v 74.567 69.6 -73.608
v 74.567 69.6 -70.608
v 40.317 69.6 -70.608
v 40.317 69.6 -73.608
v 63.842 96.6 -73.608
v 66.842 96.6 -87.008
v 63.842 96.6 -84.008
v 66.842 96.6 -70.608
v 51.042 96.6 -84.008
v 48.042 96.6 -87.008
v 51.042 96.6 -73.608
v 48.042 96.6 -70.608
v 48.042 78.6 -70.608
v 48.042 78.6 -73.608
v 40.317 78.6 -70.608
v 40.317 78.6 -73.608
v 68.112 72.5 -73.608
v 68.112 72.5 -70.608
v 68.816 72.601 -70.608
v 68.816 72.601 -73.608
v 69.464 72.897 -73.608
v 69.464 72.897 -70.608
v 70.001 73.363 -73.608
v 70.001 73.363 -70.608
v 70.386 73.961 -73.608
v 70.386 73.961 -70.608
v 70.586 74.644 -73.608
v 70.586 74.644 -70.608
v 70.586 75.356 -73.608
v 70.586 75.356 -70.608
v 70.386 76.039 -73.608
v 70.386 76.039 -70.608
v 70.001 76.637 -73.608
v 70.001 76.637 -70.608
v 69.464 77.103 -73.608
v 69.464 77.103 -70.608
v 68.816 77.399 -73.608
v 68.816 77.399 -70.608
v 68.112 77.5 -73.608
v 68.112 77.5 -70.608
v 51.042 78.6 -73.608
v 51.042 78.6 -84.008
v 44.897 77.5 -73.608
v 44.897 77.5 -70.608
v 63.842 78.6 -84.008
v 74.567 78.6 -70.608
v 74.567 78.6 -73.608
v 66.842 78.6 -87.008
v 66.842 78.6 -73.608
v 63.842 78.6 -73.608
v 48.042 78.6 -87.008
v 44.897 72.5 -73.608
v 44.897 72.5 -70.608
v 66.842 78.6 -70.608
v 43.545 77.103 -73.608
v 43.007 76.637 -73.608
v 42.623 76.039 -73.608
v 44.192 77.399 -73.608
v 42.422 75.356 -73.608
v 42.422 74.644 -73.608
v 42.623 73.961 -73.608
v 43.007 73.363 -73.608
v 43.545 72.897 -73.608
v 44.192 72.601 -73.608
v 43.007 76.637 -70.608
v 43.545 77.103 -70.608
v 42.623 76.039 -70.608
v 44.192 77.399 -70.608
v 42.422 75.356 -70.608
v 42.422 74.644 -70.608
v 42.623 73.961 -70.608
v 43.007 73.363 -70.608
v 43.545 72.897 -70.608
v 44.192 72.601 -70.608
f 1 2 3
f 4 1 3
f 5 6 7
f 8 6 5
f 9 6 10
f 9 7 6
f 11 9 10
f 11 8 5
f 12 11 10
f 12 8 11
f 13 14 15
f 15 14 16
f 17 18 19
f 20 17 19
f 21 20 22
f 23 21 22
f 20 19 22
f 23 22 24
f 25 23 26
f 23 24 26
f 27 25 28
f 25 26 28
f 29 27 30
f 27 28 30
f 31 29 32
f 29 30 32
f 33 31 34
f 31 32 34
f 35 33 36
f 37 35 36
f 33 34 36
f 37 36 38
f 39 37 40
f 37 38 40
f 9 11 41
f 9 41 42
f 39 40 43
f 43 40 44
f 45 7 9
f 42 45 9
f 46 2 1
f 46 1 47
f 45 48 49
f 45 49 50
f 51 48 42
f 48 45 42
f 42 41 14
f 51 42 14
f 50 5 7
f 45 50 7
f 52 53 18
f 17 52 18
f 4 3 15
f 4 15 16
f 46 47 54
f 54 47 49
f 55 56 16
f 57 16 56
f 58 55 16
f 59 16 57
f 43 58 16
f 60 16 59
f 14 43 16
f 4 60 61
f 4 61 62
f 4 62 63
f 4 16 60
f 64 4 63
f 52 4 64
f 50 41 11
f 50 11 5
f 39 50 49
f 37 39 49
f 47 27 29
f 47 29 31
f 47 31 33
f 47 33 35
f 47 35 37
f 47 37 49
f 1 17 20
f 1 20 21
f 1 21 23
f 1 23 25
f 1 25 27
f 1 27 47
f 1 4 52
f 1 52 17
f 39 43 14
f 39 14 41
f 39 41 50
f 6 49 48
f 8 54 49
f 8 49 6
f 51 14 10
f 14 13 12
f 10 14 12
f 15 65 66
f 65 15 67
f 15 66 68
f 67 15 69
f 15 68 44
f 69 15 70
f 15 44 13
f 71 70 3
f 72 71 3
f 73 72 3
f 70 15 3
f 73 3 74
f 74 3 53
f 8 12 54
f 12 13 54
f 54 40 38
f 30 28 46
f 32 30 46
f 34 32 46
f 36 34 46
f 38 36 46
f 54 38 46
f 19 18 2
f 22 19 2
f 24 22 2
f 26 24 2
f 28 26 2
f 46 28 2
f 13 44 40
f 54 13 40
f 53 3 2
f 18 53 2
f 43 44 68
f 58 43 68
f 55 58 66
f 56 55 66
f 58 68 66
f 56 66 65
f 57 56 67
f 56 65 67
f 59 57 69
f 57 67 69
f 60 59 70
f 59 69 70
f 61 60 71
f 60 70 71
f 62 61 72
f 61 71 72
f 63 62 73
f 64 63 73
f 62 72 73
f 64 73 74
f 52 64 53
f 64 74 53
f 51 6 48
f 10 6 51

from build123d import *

# Parameters (mm, degrees)
BOSS_EXTRUDE1_DEPTH = 17.85
SKETCH5_R           = 1
CUT_EXTRUDE1_DEPTH  = 10
SKETCH6_W           = 34.25
SKETCH6_H           = 9
BOSS_EXTRUDE2_DEPTH = 3
SKETCH7_W           = 17.85
SKETCH7_H           = 15.1
BOSS_EXTRUDE3_DEPTH = 5.225
BOSS_EXTRUDE4_START = 23.25
SKETCH7_3_W         = 17.85
SKETCH7_3_H         = 15.1
BOSS_EXTRUDE4_DEPTH = 5.225
CUT_EXTRUDE2_REACH  = 125.33
SKETCH8_W           = 7.725
SKETCH8_H           = 18
SKETCH9_W           = 34.25
SKETCH9_H           = 3
BOSS_EXTRUDE5_DEPTH = 18
SKETCH10_W          = 12.8
SKETCH10_H          = 2.9
CUT_EXTRUDE3_DEPTH  = 14.85
CUT_EXTRUDE4_REACH  = 124.932
SKETCH11_W          = 7.725
SKETCH11_H          = 18
SKETCH12_W          = 18.8
SKETCH12_H          = 18
CUT_EXTRUDE5_DEPTH  = 4.45
SKETCH13_W          = 18.8
SKETCH13_H          = 18
BOSS_EXTRUDE6_DEPTH = 3


with BuildPart() as part:
    # Sketch4 → Boss-Extrude1 (new body)
    with BuildSketch(Plane(origin=(0, 0, -70.608208955), x_dir=(-1, 0, 0), z_dir=(0, 0, -1))):
        Polygon((-69.066917791, 81.5), (-45.816917791, 81.5), (-45.816917791, 96.6), (-40.316917791, 96.6), (-40.316917791, 78.6), (-74.566917791, 78.6), (-74.566917791, 96.6), (-69.066917791, 96.6), align=None)
    extrude(amount=BOSS_EXTRUDE1_DEPTH)

    # Sketch5 → Cut-Extrude1 (cut)
    with BuildSketch(Plane(origin=(0, 0, -88.458208955), x_dir=(-1, 0, 0), z_dir=(0, 0, -1))):
        with Locations((-43.741917791, 88)):
            Circle(SKETCH5_R)
        with Locations((-71.141917791, 88)):
            Circle(SKETCH5_R)
    extrude(amount=-CUT_EXTRUDE1_DEPTH, mode=Mode.SUBTRACT)

    # Sketch6 → Boss-Extrude2 (add)
    with BuildSketch(Plane(origin=(0, 0, -70.608208955), x_dir=(-1, 0, 0), z_dir=(0, 0, -1))):
        with Locations((-57.441917791, 74.1)):
            Rectangle(SKETCH6_W, SKETCH6_H)
        with BuildLine():
            Line((-68.111940299, 77.5), (-44.896828216, 77.5))
            ThreePointArc((-44.896828216, 77.5), (-42.396828216, 75), (-44.896828216, 72.5))
            Line((-44.896828216, 72.5), (-68.111940299, 72.5))
            ThreePointArc((-68.111940299, 72.5), (-70.611940299, 75), (-68.111940299, 77.5))
        make_face(mode=Mode.SUBTRACT)
    extrude(amount=BOSS_EXTRUDE2_DEPTH)

    # Sketch7 → Boss-Extrude3 (add)
    with BuildSketch(Plane(origin=(45.816917791, 0, 0), x_dir=(0, 0, -1), z_dir=(1, 0, 0))):
        with Locations((79.533208955, 89.05)):
            Rectangle(SKETCH7_W, SKETCH7_H)
    extrude(amount=BOSS_EXTRUDE3_DEPTH)

    # Sketch7<3> → Boss-Extrude4 (add)
    with BuildSketch(Plane(origin=(45.816917791, 0, 0), x_dir=(0, 0, -1), z_dir=(1, 0, 0)).offset(BOSS_EXTRUDE4_START)):
        with Locations((79.533208955, 89.05)):
            Rectangle(SKETCH7_3_W, SKETCH7_3_H)
    extrude(amount=-BOSS_EXTRUDE4_DEPTH)

    # Sketch8 → Cut-Extrude2 (cut, up to next)
    with BuildSketch(Plane(origin=(0, 0, -88.458208955), x_dir=(-1, 0, 0), z_dir=(0, 0, -1)), mode=Mode.PRIVATE) as cut_extrude2_sk1:
        with Locations((-70.704417791, 87.6)):
            Rectangle(SKETCH8_W, SKETCH8_H)
    cut_extrude2_tool1 = extrude(cut_extrude2_sk1.sketch, amount=-CUT_EXTRUDE2_REACH, mode=Mode.PRIVATE) & part.part
    # Sketch8 → Cut-Extrude2 (cut, up to next)
    with BuildSketch(Plane(origin=(0, 0, -88.458208955), x_dir=(-1, 0, 0), z_dir=(0, 0, -1)), mode=Mode.PRIVATE) as cut_extrude2_sk2:
        with Locations((-44.179417791, 87.6)):
            Rectangle(SKETCH8_W, SKETCH8_H)
    cut_extrude2_tool2 = extrude(cut_extrude2_sk2.sketch, amount=-CUT_EXTRUDE2_REACH, mode=Mode.PRIVATE) & part.part
    add(cut_extrude2_tool1.solids().sort_by_distance((70.704418, 87.6, -88.458209))[0], mode=Mode.SUBTRACT)
    add(cut_extrude2_tool2.solids().sort_by_distance((44.179418, 87.6, -88.458209))[0], mode=Mode.SUBTRACT)

    # Sketch9 → Boss-Extrude5 (add)
    with BuildSketch(Plane(origin=(0, 78.6, 0), x_dir=(1, 0, 0), z_dir=(0, 1, 0))):
        with Locations((57.441917791, 72.108208955)):
            Rectangle(SKETCH9_W, SKETCH9_H)
    extrude(amount=BOSS_EXTRUDE5_DEPTH)

    # Sketch10 → Cut-Extrude3 (cut)
    with BuildSketch(Plane(origin=(0, 0, -88.458208955), x_dir=(-1, 0, 0), z_dir=(0, 0, -1))):
        with Locations((-57.441917791, 80.05)):
            Rectangle(SKETCH10_W, SKETCH10_H)
    extrude(amount=-CUT_EXTRUDE3_DEPTH, mode=Mode.SUBTRACT)

    # Sketch11 → Cut-Extrude4 (cut, up to next)
    with BuildSketch(Plane(origin=(0, 0, -73.608208955), x_dir=(-1, 0, 0), z_dir=(0, 0, -1)), mode=Mode.PRIVATE) as cut_extrude4_sk1:
        with Locations((-70.704417791, 87.6)):
            Rectangle(SKETCH11_W, SKETCH11_H)
    cut_extrude4_tool1 = extrude(cut_extrude4_sk1.sketch, amount=-CUT_EXTRUDE4_REACH, mode=Mode.PRIVATE) & part.part
    # Sketch11 → Cut-Extrude4 (cut, up to next)
    with BuildSketch(Plane(origin=(0, 0, -73.608208955), x_dir=(-1, 0, 0), z_dir=(0, 0, -1)), mode=Mode.PRIVATE) as cut_extrude4_sk2:
        with Locations((-44.179417791, 87.6)):
            Rectangle(SKETCH11_W, SKETCH11_H)
    cut_extrude4_tool2 = extrude(cut_extrude4_sk2.sketch, amount=-CUT_EXTRUDE4_REACH, mode=Mode.PRIVATE) & part.part
    add(cut_extrude4_tool1.solids().sort_by_distance((70.704418, 87.6, -73.608209))[0], mode=Mode.SUBTRACT)
    add(cut_extrude4_tool2.solids().sort_by_distance((44.179418, 87.6, -73.608209))[0], mode=Mode.SUBTRACT)

    # Sketch12 → Cut-Extrude5 (cut)
    with BuildSketch(Plane(origin=(0, 0, -88.458208955), x_dir=(-1, 0, 0), z_dir=(0, 0, -1))):
        with Locations((-57.441917791, 87.6)):
            Rectangle(SKETCH12_W, SKETCH12_H)
    extrude(amount=-CUT_EXTRUDE5_DEPTH, mode=Mode.SUBTRACT)

    # Sketch13 → Boss-Extrude6 (add)
    with BuildSketch(Plane(origin=(0, 0, -84.008208955), x_dir=(-1, 0, 0), z_dir=(0, 0, -1))):
        with Locations((-57.441917791, 87.6)):
            Rectangle(SKETCH13_W, SKETCH13_H)
    extrude(amount=BOSS_EXTRUDE6_DEPTH)


solid = part.part
